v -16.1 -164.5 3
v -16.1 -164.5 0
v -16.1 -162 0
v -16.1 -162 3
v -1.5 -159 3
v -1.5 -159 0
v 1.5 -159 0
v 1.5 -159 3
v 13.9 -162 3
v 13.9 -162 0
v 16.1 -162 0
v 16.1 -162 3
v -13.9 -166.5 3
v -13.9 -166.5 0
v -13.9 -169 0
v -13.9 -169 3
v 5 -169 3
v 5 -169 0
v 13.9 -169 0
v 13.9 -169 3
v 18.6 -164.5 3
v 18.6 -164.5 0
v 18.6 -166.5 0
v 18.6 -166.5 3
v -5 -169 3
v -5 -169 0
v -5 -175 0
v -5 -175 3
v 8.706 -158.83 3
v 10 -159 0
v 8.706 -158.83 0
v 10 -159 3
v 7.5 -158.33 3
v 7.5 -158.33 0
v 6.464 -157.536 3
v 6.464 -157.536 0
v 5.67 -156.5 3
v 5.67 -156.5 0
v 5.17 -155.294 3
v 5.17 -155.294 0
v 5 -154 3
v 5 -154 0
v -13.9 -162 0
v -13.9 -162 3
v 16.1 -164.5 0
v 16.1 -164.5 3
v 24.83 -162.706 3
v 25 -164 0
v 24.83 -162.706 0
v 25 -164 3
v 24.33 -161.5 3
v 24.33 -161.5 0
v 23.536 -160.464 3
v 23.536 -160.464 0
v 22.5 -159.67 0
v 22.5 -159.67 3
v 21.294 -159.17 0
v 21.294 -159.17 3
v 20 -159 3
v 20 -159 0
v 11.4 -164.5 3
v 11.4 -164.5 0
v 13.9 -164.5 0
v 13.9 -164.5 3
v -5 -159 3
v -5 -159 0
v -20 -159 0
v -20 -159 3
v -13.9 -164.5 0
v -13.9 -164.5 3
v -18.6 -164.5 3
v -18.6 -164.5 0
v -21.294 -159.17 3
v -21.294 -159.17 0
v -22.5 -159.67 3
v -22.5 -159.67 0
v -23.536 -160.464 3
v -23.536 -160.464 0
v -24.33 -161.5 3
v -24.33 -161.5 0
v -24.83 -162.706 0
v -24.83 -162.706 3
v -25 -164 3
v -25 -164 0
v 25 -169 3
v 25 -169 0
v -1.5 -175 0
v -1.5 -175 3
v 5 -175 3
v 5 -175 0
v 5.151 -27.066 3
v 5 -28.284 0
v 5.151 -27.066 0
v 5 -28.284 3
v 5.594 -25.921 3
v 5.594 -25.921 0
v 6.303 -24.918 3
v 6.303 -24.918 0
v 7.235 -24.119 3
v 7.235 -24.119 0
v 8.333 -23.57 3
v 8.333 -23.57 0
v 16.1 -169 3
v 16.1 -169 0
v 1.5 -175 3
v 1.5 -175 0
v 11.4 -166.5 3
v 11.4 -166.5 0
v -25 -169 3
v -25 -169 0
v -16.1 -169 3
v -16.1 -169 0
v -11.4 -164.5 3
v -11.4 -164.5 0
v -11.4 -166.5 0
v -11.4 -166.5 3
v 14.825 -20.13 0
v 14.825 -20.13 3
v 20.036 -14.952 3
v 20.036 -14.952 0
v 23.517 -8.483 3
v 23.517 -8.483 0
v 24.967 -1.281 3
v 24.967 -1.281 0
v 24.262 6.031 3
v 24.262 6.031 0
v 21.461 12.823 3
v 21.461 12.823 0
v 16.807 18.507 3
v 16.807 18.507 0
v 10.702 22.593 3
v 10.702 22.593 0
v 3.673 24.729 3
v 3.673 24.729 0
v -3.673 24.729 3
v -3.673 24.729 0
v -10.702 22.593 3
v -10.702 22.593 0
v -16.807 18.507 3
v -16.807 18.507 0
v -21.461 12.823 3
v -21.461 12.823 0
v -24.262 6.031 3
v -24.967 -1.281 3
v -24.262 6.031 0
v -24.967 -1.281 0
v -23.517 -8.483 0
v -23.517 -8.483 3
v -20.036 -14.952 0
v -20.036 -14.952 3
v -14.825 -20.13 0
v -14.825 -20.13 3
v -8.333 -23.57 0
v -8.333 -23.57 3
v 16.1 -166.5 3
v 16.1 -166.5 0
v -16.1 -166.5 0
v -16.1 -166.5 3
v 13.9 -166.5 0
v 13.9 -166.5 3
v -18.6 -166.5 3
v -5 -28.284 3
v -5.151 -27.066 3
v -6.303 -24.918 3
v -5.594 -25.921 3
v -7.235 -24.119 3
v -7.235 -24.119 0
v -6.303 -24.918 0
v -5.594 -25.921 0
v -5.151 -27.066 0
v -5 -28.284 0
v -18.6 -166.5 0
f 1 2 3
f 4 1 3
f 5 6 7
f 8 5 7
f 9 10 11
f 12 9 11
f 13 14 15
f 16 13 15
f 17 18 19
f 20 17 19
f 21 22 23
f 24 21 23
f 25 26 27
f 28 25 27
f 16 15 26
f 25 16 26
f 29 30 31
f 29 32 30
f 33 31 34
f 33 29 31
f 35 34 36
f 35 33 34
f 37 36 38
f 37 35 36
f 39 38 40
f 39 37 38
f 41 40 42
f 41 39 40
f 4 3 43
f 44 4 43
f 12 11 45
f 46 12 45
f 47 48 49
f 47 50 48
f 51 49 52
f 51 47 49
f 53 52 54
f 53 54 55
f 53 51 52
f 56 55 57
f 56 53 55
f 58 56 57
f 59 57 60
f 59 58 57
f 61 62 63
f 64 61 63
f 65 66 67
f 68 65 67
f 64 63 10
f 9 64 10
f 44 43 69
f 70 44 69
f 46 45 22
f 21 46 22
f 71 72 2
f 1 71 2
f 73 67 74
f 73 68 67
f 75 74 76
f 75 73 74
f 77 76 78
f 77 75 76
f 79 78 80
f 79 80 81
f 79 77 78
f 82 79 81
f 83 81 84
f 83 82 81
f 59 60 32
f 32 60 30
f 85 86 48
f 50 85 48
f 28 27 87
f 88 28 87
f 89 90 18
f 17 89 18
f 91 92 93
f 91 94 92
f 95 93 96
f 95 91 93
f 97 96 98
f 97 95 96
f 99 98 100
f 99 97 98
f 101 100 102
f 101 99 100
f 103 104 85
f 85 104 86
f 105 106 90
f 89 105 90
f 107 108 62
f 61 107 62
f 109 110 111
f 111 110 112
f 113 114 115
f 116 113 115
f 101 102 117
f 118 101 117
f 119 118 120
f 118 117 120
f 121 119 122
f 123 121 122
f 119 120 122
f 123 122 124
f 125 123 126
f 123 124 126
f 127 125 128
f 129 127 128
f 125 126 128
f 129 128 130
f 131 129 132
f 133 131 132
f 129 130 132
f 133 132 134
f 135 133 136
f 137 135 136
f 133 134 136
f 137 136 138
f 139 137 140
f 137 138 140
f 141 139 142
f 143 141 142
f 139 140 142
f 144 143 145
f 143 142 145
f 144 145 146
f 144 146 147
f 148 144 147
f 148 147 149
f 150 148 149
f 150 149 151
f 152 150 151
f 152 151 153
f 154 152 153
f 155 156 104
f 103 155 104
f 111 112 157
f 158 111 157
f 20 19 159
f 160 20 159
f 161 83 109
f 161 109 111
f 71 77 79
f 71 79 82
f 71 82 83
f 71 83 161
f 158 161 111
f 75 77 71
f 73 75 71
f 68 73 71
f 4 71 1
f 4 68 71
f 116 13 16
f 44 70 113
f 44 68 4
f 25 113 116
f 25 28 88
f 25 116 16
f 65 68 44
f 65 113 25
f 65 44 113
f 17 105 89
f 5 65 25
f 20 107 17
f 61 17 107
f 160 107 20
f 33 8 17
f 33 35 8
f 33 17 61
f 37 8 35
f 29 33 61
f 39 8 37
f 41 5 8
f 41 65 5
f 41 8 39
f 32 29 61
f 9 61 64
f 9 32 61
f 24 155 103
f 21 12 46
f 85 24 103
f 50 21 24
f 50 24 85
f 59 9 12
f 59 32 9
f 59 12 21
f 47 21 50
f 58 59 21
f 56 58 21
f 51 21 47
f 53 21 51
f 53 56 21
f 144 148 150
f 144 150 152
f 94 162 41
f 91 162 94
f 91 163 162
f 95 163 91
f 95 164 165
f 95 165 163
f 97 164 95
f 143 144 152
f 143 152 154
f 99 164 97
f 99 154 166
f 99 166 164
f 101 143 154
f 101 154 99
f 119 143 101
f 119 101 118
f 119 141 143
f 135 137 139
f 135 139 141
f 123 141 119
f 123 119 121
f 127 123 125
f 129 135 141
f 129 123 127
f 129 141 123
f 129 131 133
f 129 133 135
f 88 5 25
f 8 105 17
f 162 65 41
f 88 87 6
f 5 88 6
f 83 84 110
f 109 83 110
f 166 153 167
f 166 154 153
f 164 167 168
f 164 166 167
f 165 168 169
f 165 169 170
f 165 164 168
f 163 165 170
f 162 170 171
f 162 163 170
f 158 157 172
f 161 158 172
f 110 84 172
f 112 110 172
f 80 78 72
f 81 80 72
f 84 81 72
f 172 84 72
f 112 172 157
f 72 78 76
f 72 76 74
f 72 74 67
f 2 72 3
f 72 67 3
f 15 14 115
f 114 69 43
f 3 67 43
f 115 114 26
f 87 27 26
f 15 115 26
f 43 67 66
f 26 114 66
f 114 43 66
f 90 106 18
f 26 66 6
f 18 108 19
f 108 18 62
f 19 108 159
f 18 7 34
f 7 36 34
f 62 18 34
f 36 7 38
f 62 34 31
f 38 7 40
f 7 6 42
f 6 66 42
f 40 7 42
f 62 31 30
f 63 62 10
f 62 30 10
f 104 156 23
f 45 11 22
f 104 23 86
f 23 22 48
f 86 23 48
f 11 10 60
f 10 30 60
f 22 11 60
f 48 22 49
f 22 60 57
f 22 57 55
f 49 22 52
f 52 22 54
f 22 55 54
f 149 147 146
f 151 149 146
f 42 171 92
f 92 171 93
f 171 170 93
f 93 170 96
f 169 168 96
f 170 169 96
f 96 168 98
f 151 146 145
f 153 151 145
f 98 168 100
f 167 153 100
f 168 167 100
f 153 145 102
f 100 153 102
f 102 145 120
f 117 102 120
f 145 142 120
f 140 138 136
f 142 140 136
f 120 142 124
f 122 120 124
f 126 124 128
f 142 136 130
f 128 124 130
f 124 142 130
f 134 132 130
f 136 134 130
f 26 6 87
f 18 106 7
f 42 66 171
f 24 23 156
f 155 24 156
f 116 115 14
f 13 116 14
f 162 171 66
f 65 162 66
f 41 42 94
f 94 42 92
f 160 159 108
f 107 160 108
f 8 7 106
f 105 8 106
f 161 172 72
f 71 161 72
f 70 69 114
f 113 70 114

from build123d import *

# Parameters (mm, degrees)
BOSS_EXTRUDE1_DEPTH = 3
FILLET1_R           = 5


with BuildPart() as part:
    # Sketch1 → Boss-Extrude1 (new body)
    with BuildSketch(Plane.XY):
        with BuildLine():
            Line((-5, -25), (-5, -159))
            Line((-5, -159), (-25, -159))
            Line((-25, -159), (-25, -169))
            Line((-25, -169), (-16.1, -169))
            Line((-16.1, -169), (-16.1, -166.5))
            Line((-16.1, -166.5), (-18.6, -166.5))
            Line((-18.6, -166.5), (-18.6, -164.5))
            Line((-18.6, -164.5), (-16.1, -164.5))
            Line((-16.1, -164.5), (-16.1, -162))
            Line((-16.1, -162), (-13.9, -162))
            Line((-13.9, -162), (-13.9, -164.5))
            Line((-13.9, -164.5), (-11.4, -164.5))
            Line((-11.4, -164.5), (-11.4, -166.5))
            Line((-11.4, -166.5), (-13.9, -166.5))
            Line((-13.9, -166.5), (-13.9, -169))
            Line((-13.9, -169), (-5, -169))
            Line((-5, -169), (-5, -175))
            Line((-5, -175), (-1.5, -175))
            Line((-1.5, -175), (-1.5, -159))
            Line((-1.5, -159), (1.5, -159))
            Line((1.5, -159), (1.5, -175))
            Line((1.5, -175), (5, -175))
            Line((5, -175), (5, -169))
            Line((5, -169), (13.9, -169))
            Line((13.9, -169), (13.9, -166.5))
            Line((13.9, -166.5), (11.4, -166.5))
            Line((11.4, -166.5), (11.4, -164.5))
            Line((11.4, -164.5), (13.9, -164.5))
            Line((13.9, -164.5), (13.9, -162))
            Line((13.9, -162), (16.1, -162))
            Line((16.1, -162), (16.1, -164.5))
            Line((16.1, -164.5), (18.6, -164.5))
            Line((18.6, -164.5), (18.6, -166.5))
            Line((18.6, -166.5), (16.1, -166.5))
            Line((16.1, -166.5), (16.1, -169))
            Line((16.1, -169), (25, -169))
            Line((25, -169), (25, -159))
            Line((25, -159), (5, -159))
            Line((5, -159), (5, -25))
            Line((5, -25), (5, -24.494897428))
            ThreePointArc((5, -24.494897428), (0, 25), (-5, -24.494897428))
            Line((-5, -24.494897428), (-5, -25))
        make_face()
    extrude(amount=BOSS_EXTRUDE1_DEPTH)

    # Fillet1
    fillet1_edges = [part.edges().sort_by_distance(p)[0] for p in [
        (5, -24.494897428, 1.5),
        (5, -159, 1.5),
        (25, -159, 1.5),
        (-25, -159, 1.5),
        (-5, -24.494897428, 1.5),
    ]]
    fillet(fillet1_edges, radius=FILLET1_R)


solid = part.part
